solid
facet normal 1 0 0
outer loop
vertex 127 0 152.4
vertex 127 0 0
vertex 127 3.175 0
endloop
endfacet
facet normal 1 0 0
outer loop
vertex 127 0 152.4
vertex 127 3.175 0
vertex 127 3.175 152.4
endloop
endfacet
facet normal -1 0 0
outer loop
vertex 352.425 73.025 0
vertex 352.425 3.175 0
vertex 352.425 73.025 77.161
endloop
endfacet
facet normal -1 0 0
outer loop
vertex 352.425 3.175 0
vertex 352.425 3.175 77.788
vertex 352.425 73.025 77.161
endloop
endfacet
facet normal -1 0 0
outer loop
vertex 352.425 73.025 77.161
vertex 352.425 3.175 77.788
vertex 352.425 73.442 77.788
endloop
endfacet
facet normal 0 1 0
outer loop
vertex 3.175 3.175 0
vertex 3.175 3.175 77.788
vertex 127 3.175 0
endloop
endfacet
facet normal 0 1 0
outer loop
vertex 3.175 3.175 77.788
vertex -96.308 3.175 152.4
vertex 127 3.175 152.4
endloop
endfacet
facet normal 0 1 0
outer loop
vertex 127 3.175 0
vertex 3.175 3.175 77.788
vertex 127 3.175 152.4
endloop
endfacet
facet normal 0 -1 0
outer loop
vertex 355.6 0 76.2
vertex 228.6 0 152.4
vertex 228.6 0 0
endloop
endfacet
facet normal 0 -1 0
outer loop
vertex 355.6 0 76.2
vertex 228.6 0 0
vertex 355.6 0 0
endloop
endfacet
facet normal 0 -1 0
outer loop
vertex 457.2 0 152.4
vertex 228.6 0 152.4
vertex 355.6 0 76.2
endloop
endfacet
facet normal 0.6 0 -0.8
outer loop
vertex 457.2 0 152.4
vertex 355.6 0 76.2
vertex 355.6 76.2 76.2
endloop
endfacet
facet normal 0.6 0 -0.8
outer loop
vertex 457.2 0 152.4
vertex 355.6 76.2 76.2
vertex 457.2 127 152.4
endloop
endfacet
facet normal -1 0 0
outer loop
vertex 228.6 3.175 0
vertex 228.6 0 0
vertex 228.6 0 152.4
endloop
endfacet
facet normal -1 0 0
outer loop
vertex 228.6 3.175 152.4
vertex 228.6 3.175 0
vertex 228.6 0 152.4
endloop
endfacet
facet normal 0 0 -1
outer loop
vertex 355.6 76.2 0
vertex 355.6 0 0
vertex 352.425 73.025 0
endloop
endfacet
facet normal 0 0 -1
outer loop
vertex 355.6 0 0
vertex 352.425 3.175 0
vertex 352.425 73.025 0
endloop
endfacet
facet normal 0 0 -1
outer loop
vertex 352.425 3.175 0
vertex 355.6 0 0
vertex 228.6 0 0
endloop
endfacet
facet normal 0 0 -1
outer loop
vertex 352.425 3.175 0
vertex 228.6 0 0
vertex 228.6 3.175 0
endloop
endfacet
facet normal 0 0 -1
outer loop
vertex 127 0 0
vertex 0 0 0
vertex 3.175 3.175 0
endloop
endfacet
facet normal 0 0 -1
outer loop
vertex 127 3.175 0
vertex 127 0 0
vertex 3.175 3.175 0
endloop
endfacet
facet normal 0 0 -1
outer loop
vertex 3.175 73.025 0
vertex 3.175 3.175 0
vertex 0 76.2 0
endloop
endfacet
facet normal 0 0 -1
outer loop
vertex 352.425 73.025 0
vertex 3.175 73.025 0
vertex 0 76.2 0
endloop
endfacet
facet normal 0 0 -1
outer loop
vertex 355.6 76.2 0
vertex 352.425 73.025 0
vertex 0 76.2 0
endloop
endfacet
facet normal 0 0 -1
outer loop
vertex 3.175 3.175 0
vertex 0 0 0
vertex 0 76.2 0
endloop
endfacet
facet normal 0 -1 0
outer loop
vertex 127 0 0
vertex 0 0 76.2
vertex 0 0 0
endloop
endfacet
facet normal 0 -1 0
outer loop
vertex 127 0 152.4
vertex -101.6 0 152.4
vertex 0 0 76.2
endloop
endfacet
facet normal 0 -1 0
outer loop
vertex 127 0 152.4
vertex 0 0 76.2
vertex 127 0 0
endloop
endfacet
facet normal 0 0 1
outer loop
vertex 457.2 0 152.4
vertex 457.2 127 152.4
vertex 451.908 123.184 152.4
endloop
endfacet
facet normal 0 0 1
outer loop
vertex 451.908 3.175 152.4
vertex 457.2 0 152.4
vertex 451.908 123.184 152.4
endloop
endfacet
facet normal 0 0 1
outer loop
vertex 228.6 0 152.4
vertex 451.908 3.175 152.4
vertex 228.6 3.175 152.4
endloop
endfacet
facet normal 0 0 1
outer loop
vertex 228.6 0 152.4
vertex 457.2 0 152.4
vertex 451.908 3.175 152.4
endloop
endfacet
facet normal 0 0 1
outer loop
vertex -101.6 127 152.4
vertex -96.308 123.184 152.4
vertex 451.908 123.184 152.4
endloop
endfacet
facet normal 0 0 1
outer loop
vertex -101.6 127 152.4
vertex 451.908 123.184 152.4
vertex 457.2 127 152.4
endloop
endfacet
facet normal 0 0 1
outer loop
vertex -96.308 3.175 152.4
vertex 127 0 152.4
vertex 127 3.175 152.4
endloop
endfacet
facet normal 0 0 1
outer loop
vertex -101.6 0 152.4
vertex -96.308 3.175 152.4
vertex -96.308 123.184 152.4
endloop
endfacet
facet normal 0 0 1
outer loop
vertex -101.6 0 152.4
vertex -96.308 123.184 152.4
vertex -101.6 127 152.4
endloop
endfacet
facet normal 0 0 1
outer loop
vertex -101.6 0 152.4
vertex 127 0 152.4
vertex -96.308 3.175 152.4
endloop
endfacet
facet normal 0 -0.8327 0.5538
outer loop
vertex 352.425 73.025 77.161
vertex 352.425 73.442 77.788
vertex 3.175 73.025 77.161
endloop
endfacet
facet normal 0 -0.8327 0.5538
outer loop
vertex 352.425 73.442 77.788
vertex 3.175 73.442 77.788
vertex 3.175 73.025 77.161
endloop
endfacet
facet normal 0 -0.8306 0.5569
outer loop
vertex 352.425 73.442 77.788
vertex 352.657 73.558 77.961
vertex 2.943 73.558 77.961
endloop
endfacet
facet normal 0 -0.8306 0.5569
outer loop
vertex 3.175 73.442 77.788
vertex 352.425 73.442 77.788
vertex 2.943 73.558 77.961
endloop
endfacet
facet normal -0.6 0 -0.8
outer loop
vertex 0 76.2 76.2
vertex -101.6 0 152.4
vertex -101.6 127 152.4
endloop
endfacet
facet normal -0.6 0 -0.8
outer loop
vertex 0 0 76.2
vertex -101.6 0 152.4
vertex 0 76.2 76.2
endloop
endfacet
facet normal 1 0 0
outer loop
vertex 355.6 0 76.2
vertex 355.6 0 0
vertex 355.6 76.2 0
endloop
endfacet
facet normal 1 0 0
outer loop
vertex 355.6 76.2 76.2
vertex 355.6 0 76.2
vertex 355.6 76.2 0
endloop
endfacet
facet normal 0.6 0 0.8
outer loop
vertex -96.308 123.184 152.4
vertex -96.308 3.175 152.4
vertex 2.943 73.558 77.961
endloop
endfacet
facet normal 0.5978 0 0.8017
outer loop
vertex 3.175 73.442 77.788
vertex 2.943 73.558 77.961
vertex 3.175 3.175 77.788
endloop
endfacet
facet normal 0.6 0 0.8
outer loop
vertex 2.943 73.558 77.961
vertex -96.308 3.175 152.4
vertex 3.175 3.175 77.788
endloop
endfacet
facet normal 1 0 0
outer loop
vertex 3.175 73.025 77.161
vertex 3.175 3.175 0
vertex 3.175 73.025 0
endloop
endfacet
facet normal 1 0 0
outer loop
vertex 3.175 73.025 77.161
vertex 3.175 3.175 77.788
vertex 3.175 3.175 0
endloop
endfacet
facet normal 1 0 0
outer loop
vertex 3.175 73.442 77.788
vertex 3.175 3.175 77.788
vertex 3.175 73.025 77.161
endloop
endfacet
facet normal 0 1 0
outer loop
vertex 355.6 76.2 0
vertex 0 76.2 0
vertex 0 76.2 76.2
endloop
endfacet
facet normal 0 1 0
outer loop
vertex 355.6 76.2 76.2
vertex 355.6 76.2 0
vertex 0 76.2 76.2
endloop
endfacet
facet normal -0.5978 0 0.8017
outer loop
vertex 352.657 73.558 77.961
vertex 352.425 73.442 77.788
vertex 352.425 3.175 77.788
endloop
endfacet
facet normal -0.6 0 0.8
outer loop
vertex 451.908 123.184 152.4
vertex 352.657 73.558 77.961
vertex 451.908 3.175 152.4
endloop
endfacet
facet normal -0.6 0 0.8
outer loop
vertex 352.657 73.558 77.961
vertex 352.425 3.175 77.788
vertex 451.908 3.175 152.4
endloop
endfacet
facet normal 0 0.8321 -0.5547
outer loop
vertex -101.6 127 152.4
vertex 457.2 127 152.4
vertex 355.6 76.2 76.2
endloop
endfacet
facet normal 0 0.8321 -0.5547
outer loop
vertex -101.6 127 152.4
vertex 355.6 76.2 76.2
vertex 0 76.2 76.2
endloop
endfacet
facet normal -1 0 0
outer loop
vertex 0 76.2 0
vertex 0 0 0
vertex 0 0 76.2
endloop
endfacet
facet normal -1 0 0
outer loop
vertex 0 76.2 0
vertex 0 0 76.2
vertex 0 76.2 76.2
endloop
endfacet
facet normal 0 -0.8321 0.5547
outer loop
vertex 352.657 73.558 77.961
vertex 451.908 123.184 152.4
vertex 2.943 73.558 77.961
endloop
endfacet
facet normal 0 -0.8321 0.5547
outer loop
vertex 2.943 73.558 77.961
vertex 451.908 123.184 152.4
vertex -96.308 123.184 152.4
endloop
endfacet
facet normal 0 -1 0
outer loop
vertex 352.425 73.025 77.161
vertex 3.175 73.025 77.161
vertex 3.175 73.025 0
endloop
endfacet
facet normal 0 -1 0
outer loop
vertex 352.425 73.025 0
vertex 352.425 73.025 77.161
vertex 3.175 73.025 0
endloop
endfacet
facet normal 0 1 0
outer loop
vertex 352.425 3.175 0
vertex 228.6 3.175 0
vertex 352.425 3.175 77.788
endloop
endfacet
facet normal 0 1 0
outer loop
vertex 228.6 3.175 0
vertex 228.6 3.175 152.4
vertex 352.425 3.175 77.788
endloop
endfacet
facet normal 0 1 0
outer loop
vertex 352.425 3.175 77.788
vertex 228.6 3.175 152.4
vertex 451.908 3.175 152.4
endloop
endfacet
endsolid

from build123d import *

# Parameters (mm, degrees)
F1_DEPTH    = 355.6
F2_W        = 355.6
F2_H        = 76.2
F3_DEPTH    = 127
F5_DEPTH    = 457.201
F6_DEPTH    = 101.601
F7_T        = 3.175
F7_T3_DEPTH = 82.55
F7_T5_DEPTH = 361.95
F8_W        = 101.6
F8_H        = 228.6
F9_DEPTH    = 25.4


# Not quite as in the source:
# - a shell that OpenCascade refuses in one call is made with other operations: the cavity is built on its own and cut out


with BuildPart() as f1:
    # F0 (on Right) → F1 (new body)
    with BuildSketch(Plane.YZ):
        Polygon((0, 152.4), (0, 0), (76.2, 0), (76.2, 76.2), (76.2, 152.4), align=None)
        Polygon((76.2, 152.4), (76.2, 76.2), (127, 152.4), align=None)
    extrude(amount=F1_DEPTH)

    # F2 (on face) → F3 (join)
    with BuildSketch(Plane.XZ):
        Polygon((457.2, 152.4), (355.6, 152.4), (355.6, 76.2), align=None)
        Polygon((0, 76.2), (0, 152.4), (-101.6, 152.4), align=None)
        with Locations((177.8, 114.3)):
            Rectangle(F2_W, F2_H)
    extrude(amount=-F3_DEPTH)

    # F4 (on face) → F5 (cut, through all)
    with BuildSketch(Plane.YZ.offset(355.6)):
        Polygon((76.2, 76.2), (127, 76.2), (127, 152.4), align=None)
    extrude(amount=-F5_DEPTH, mode=Mode.SUBTRACT)

    # F4 (on face) → F6 (cut, through all)
    with BuildSketch(Plane.YZ.offset(355.6)):
        Polygon((76.2, 76.2), (127, 76.2), (127, 152.4), align=None)
    extrude(amount=F6_DEPTH, mode=Mode.SUBTRACT)

    # F7: shell of thickness 3.175, made by hand


with BuildPart() as f7_core1:
    # F7_t2: copy of F1
    add(f1.part)

    # the walls: a layer under each face that stays
    f7_faces = [f7_core1.faces().sort_by_distance(p)[0] for p in [
        (177.8, 0, 76.2),
        (-50.8, 63.5, 114.3),
        (177.8, 101.6, 114.3),
        (177.8, 76.2, 38.1),
        (0, 38.1, 38.1),
        (355.6, 38.1, 38.1),
        (406.4, 63.5, 114.3),
    ]]
    thicken(f7_faces, amount=-F7_T, mode=Mode.SUBTRACT)

    # F7_s4 → F7_t3 (cut)
    with BuildSketch(Plane.XZ.offset(-79.375)):
        Polygon((-0.0508, 76.1746), (1.905, 78.74), (3.175, 77.7875), (3.175, 76.2), align=None)
        Polygon((355.6508, 76.1746), (352.425, 76.2), (352.425, 77.7875), (353.695, 78.74), align=None)
    extrude(amount=F7_T3_DEPTH, mode=Mode.SUBTRACT)

    # F7_s6 → F7_t5 (cut)
    with BuildSketch(Plane.YZ.offset(-3.175)):
        Polygon((76.2581675968, 76.1823882688), (73.5582403155, 77.961173123), (73.025, 77.1613126498), (73.025, 76.2), align=None)
    extrude(amount=F7_T5_DEPTH, mode=Mode.SUBTRACT)


with BuildPart() as f1_1:
    add(f1.part)

    # what is left inside the walls is the cavity
    f7_cavity = [f7_core1.part.solids().sort_by_distance(p)[0] for p in [
        (269.169444, 63.179562, 152.36825),
    ]]
    add(f7_cavity, mode=Mode.SUBTRACT)

    # F8 (on face) → F9 (cut)
    with BuildSketch(Plane.XZ):
        with Locations((177.8, 38.1)):
            Rectangle(F8_W, F8_H)
    extrude(amount=-F9_DEPTH, mode=Mode.SUBTRACT)


solid = f1_1.part
